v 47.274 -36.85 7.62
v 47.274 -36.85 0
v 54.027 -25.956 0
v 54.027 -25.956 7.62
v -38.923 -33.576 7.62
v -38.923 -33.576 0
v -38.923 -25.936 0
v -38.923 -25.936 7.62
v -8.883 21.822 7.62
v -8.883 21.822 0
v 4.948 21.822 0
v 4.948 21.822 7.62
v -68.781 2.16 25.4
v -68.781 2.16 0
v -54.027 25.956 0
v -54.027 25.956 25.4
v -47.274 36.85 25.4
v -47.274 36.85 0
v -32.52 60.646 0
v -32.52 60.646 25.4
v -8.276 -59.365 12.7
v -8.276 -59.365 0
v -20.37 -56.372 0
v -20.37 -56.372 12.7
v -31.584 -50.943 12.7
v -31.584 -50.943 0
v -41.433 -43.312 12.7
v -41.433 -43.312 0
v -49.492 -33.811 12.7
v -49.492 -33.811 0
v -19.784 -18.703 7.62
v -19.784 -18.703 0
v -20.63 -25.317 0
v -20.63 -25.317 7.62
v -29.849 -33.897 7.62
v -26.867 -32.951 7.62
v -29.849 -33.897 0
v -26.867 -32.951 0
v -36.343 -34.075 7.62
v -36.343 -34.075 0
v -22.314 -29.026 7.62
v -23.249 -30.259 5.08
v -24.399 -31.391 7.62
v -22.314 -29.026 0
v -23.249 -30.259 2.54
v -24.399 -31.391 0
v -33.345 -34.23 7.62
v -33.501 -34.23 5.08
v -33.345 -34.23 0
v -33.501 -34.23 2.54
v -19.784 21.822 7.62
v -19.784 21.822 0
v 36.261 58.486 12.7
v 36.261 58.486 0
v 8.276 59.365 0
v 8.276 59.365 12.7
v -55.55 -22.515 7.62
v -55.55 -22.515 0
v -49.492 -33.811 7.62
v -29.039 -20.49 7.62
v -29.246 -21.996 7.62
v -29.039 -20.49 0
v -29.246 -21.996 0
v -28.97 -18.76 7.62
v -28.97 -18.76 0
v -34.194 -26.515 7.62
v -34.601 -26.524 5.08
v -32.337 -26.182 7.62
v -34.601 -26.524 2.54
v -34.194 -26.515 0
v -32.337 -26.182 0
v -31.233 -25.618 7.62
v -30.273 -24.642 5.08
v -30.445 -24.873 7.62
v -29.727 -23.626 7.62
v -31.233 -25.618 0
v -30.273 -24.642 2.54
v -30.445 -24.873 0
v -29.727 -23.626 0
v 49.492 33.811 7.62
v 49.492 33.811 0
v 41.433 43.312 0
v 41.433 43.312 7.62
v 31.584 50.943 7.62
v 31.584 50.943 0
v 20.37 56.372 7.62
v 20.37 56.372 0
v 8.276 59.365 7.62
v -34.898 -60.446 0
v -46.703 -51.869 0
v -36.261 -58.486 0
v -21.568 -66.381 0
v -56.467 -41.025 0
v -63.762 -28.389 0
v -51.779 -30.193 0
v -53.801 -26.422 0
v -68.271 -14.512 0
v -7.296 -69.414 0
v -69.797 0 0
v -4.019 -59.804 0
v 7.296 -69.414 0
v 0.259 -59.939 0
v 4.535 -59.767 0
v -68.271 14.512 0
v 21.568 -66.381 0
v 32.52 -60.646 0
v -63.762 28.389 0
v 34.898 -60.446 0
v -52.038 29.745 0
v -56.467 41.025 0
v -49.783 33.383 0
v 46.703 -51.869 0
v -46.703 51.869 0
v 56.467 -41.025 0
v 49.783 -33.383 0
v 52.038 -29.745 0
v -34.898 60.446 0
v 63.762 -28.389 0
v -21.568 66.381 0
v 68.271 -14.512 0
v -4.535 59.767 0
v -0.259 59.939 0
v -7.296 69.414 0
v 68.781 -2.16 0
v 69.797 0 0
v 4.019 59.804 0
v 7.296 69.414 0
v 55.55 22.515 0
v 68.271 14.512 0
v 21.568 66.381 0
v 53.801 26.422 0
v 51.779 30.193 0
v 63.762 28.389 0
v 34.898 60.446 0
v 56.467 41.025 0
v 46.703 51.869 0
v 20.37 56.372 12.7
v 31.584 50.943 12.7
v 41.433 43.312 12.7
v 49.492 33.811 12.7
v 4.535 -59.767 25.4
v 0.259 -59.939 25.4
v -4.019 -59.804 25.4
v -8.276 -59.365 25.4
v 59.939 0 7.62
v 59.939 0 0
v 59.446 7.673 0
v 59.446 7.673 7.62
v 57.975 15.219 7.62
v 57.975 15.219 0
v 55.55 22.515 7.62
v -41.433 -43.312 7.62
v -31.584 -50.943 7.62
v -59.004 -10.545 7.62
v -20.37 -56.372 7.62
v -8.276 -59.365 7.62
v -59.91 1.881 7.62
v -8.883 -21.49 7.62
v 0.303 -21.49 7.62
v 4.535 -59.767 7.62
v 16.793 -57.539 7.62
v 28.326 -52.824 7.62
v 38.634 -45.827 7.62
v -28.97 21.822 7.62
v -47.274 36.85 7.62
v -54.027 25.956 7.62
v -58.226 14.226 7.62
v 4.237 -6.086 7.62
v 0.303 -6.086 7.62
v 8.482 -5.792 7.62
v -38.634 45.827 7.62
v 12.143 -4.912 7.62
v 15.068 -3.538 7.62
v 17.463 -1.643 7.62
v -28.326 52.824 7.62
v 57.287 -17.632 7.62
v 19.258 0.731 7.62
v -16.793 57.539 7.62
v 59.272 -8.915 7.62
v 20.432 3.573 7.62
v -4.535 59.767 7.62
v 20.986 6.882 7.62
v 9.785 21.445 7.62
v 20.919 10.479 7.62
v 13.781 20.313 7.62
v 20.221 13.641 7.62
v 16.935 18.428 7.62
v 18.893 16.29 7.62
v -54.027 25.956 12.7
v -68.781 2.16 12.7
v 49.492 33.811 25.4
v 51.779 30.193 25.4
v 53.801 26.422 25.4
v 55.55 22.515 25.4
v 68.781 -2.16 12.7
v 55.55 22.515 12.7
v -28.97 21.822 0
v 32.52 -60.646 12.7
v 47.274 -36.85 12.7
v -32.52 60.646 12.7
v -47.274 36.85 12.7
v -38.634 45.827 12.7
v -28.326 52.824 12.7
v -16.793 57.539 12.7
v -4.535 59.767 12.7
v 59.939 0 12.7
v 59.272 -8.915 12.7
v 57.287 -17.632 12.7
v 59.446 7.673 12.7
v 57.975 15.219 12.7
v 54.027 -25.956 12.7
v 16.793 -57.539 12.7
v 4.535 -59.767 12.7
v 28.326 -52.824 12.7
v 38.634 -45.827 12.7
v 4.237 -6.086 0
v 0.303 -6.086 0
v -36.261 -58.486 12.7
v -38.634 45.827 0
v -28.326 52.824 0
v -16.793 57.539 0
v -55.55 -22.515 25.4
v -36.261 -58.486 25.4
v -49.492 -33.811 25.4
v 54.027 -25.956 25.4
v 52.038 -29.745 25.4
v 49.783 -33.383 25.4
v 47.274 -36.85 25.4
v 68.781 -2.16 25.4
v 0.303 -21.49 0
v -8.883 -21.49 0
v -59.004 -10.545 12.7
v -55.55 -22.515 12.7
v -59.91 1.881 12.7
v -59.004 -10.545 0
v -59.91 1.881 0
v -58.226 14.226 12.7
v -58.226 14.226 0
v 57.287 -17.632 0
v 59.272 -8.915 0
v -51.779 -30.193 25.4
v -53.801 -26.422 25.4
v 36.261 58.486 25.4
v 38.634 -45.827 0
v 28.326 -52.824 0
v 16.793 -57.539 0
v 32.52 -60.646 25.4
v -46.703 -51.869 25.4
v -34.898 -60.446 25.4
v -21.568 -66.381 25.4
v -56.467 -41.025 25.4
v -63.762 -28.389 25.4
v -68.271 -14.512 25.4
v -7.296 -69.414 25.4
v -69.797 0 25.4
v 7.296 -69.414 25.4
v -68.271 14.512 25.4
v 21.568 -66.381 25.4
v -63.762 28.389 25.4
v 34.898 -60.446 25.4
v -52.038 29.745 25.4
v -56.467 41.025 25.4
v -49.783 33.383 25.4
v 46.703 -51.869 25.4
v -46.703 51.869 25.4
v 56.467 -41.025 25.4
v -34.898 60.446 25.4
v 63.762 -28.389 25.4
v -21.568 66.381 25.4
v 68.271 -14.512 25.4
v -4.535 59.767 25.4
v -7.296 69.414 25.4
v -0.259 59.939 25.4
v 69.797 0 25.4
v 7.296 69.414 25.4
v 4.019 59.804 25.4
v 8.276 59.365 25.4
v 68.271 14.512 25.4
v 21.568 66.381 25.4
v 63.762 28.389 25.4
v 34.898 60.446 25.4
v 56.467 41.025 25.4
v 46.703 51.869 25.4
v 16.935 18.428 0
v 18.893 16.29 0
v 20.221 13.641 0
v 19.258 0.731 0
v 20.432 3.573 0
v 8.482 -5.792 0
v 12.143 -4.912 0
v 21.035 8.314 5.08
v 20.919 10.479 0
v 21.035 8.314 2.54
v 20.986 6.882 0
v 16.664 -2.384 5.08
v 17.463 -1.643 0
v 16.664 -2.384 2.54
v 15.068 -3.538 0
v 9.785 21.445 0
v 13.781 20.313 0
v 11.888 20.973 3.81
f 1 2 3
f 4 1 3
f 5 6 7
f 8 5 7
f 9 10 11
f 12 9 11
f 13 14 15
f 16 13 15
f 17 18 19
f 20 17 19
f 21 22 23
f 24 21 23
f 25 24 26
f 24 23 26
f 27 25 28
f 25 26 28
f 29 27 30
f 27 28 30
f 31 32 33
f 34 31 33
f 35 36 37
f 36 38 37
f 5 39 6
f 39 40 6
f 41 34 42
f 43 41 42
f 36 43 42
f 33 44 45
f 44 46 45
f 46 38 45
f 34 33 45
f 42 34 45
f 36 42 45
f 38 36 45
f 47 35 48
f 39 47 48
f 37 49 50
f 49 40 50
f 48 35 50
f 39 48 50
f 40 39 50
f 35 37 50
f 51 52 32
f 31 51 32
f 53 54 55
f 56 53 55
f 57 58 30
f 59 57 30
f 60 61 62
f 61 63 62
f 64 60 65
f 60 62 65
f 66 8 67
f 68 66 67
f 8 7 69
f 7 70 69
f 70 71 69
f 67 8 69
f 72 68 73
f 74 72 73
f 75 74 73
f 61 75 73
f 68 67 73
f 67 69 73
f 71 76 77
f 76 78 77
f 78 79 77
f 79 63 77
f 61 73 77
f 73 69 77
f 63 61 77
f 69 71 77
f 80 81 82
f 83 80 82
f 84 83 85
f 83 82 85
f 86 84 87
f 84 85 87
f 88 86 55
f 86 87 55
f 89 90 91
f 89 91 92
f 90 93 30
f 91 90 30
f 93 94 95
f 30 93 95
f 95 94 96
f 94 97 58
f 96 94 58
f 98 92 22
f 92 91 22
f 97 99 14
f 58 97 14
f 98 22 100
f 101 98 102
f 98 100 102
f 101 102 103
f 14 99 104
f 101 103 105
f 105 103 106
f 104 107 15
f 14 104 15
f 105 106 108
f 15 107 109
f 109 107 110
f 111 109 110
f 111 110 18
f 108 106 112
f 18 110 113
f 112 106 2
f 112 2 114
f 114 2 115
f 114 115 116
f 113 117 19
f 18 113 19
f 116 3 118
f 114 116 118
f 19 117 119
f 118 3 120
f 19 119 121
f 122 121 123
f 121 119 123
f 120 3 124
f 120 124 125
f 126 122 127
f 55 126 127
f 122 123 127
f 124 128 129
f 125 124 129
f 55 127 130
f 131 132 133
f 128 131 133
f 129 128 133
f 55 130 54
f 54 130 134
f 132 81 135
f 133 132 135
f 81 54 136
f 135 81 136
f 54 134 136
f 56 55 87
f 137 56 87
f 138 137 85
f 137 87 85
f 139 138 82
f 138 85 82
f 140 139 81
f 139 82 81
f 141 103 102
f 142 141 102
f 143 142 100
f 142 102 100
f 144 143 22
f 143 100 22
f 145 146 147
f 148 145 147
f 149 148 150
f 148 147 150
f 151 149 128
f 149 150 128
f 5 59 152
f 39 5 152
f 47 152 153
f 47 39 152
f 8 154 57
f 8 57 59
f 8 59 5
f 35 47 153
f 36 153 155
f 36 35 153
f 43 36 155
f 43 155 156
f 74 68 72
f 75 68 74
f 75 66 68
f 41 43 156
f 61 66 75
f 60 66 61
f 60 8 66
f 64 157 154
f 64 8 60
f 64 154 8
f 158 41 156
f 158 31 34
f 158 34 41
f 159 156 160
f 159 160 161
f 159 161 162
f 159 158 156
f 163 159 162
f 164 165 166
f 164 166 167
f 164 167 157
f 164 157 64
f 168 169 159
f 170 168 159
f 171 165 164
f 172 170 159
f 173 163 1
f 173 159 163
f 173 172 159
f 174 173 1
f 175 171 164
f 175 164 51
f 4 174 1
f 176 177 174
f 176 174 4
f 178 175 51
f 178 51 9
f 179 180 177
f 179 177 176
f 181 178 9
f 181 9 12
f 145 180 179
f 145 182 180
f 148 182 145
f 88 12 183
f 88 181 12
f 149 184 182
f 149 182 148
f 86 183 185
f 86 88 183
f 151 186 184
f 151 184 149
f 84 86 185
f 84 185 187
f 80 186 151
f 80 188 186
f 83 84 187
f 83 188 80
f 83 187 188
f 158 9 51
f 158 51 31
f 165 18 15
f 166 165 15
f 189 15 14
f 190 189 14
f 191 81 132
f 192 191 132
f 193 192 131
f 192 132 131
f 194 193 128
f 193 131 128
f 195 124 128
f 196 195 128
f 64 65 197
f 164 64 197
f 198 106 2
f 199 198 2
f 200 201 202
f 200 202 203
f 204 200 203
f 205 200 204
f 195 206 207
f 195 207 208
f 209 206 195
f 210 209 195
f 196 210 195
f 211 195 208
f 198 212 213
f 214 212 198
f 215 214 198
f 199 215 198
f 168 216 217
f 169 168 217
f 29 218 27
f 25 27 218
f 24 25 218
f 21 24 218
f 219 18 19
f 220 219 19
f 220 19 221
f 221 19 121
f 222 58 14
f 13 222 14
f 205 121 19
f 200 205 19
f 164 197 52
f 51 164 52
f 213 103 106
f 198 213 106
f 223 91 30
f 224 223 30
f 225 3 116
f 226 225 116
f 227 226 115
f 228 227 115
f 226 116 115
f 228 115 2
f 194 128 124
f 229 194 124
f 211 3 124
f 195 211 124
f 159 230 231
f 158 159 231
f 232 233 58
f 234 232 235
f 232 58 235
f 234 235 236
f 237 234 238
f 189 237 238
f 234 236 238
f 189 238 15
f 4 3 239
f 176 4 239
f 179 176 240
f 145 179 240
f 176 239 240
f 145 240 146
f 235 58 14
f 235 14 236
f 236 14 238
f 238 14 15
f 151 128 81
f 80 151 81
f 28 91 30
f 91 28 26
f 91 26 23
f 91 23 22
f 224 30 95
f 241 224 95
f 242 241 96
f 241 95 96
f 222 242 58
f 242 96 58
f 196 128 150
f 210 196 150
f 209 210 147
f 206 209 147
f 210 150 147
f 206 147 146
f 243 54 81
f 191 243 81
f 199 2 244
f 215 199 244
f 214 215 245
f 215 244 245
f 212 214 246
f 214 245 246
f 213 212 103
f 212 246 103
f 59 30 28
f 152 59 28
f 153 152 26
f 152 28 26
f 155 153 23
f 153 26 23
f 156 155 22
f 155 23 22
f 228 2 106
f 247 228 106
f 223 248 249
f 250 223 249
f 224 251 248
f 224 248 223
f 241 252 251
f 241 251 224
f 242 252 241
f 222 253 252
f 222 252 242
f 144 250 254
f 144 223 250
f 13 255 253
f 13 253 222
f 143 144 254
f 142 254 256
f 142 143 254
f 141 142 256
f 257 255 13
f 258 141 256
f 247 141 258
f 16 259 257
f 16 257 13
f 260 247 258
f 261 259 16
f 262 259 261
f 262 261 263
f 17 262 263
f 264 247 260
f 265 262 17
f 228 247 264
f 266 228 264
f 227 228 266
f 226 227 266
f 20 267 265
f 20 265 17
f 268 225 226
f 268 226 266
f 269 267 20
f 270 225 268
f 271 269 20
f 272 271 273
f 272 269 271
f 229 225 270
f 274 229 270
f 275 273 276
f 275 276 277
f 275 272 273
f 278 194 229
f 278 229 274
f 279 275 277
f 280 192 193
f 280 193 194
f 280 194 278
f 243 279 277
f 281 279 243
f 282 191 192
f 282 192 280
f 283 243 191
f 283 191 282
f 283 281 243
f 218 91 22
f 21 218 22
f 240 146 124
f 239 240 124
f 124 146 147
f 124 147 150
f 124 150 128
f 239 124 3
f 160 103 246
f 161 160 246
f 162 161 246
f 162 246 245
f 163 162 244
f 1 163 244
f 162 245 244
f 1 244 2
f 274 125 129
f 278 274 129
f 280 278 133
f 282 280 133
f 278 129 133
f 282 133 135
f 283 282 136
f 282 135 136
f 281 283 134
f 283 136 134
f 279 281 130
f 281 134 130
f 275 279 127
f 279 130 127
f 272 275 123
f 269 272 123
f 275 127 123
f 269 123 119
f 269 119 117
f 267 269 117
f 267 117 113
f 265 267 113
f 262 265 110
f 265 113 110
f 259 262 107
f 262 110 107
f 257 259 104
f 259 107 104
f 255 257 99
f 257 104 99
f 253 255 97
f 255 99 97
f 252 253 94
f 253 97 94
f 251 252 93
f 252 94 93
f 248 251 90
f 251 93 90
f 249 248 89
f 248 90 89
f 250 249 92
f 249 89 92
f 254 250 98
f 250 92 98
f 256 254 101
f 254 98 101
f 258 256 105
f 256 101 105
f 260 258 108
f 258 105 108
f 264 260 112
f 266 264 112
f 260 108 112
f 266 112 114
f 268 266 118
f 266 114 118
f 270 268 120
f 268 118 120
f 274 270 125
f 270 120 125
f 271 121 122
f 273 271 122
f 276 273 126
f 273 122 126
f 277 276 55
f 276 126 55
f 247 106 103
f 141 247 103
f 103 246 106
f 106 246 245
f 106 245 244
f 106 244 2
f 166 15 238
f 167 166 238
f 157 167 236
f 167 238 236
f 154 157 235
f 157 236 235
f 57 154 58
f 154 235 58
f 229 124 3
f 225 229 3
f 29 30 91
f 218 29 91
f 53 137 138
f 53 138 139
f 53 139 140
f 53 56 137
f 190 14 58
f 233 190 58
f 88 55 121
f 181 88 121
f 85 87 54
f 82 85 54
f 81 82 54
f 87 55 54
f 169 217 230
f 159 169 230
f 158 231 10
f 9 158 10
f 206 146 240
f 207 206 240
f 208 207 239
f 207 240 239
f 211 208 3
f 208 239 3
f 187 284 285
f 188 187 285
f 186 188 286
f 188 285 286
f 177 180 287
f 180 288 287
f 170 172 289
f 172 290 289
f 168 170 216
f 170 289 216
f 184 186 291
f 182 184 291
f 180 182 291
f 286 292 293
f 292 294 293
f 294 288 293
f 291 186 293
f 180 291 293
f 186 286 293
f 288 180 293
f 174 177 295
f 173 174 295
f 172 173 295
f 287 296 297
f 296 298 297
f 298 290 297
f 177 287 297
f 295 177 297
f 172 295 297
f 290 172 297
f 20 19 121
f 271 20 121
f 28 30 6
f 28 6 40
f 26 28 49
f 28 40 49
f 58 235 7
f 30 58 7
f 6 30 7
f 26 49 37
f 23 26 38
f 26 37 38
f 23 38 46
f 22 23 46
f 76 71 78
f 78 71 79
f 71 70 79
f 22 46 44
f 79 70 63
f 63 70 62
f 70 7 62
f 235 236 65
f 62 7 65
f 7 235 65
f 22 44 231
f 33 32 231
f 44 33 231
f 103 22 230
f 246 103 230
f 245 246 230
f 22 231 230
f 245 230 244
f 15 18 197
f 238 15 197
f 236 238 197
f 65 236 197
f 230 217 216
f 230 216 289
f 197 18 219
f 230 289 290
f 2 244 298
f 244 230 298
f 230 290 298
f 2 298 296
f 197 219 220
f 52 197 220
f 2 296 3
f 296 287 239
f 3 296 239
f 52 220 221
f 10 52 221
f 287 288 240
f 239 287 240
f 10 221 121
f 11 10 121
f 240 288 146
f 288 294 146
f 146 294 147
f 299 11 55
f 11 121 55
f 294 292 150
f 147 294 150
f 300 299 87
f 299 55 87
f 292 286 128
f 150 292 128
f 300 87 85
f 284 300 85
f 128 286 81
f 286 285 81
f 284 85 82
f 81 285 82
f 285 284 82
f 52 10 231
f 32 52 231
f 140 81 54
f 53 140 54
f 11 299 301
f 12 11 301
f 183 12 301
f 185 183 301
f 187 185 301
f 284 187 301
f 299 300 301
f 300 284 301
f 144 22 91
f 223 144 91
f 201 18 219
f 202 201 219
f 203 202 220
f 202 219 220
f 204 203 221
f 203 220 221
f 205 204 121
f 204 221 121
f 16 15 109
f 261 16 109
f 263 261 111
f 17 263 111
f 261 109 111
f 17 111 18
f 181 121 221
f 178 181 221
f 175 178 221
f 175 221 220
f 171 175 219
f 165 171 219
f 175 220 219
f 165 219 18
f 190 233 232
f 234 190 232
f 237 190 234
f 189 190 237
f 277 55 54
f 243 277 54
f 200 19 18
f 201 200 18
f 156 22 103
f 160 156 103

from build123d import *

# Parameters (mm, degrees)
F0_R     = 69.796681711
F1_DEPTH = 25.4
F2_DEPTH = 12.7
F3_DEPTH = 7.62


with BuildPart() as f1:
    # F0 (on Top) → F1 (new body)
    with BuildSketch(Plane.XY):
        Circle(F0_R)
        with BuildLine():
            Line((8.2760019114, 59.3649804818), (36.2610376693, 58.4861839798))
            Line((36.2610376693, 58.4861839798), (49.4924954528, 33.8110338366))
            ThreePointArc((49.4924954528, 33.8110338366), (52.8238405465, 28.3255182682), (55.5495821482, 22.5152623438))
            Line((55.5495821482, 22.5152623438), (68.7810399316, -2.1598877993))
            Line((68.7810399316, -2.1598877993), (54.0274619571, -25.9562414405))
            ThreePointArc((54.0274619571, -25.9562414405), (50.9425386689, -31.5840287047), (47.2735802367, -36.849718138))
            Line((47.2735802367, -36.849718138), (32.5200022623, -60.6460717791))
            Line((32.5200022623, -60.6460717791), (4.5349665043, -59.7672752771))
            ThreePointArc((4.5349665043, -59.7672752771), (-1.8813018777, -59.9095469729), (-8.2760019114, -59.3649804818))
            Line((-8.2760019114, -59.3649804818), (-36.2610376693, -58.4861839798))
            Line((-36.2610376693, -58.4861839798), (-49.4924954528, -33.8110338366))
            ThreePointArc((-49.4924954528, -33.8110338366), (-52.8238405465, -28.3255182682), (-55.5495821482, -22.5152623438))
            Line((-55.5495821482, -22.5152623438), (-68.7810399316, 2.1598877993))
            Line((-68.7810399316, 2.1598877993), (-54.0274619571, 25.9562414405))
            ThreePointArc((-54.0274619571, 25.9562414405), (-50.9425386689, 31.5840287047), (-47.2735802367, 36.849718138))
            Line((-47.2735802367, 36.849718138), (-32.5200022623, 60.6460717791))
            Line((-32.5200022623, 60.6460717791), (-4.5349665043, 59.7672752771))
            ThreePointArc((-4.5349665043, 59.7672752771), (1.8813018777, 59.9095469729), (8.2760019114, 59.3649804818))
        make_face(mode=Mode.SUBTRACT)
    extrude(amount=F1_DEPTH)


with BuildPart() as f2:
    # F0 (on Top) → F2 (new body)
    with BuildSketch(Plane.XY):
        with BuildLine():
            ThreePointArc((-55.5495821482, -22.5152623438), (-59.9095469729, 1.8813018777), (-54.0274619571, 25.9562414405))
            Line((-54.0274619571, 25.9562414405), (-68.7810399316, 2.1598877993))
            Line((-68.7810399316, 2.1598877993), (-55.5495821482, -22.5152623438))
        make_face()
    extrude(amount=F2_DEPTH)


with BuildPart() as f2b:
    # F0 (on Top) → F2, piece 2 (new body)
    with BuildSketch(Plane.XY):
        with BuildLine():
            ThreePointArc((-8.2760019114, -59.3649804818), (-31.5840287047, -50.9425386689), (-49.4924954528, -33.8110338366))
            Line((-49.4924954528, -33.8110338366), (-36.2610376693, -58.4861839798))
            Line((-36.2610376693, -58.4861839798), (-8.2760019114, -59.3649804818))
        make_face()
    extrude(amount=F2_DEPTH)


with BuildPart() as f2c:
    # F0 (on Top) → F2, piece 3 (new body)
    with BuildSketch(Plane.XY):
        with BuildLine():
            ThreePointArc((-47.2735802367, 36.849718138), (-28.3255182682, 52.8238405465), (-4.5349665043, 59.7672752771))
            Line((-4.5349665043, 59.7672752771), (-32.5200022623, 60.6460717791))
            Line((-32.5200022623, 60.6460717791), (-47.2735802367, 36.849718138))
        make_face()
    extrude(amount=F2_DEPTH)


with BuildPart() as f2d:
    # F0 (on Top) → F2, piece 4 (new body)
    with BuildSketch(Plane.XY):
        with BuildLine():
            Line((49.4924954528, 33.8110338366), (36.2610376693, 58.4861839798))
            Line((36.2610376693, 58.4861839798), (8.2760019114, 59.3649804818))
            ThreePointArc((8.2760019114, 59.3649804818), (31.5840287047, 50.9425386689), (49.4924954528, 33.8110338366))
        make_face()
    extrude(amount=F2_DEPTH)


with BuildPart() as f2e:
    # F0 (on Top) → F2, piece 5 (new body)
    with BuildSketch(Plane.XY):
        with BuildLine():
            Line((68.7810399316, -2.1598877993), (55.5495821482, 22.5152623438))
            ThreePointArc((55.5495821482, 22.5152623438), (58.8314706291, 11.4695762285), (59.939078365, 0))
            ThreePointArc((59.939078365, 0), (58.4424904986, -13.3104627856), (54.0274619571, -25.9562414405))
            Line((54.0274619571, -25.9562414405), (68.7810399316, -2.1598877993))
        make_face()
    extrude(amount=F2_DEPTH)


with BuildPart() as f2f:
    # F0 (on Top) → F2, piece 6 (new body)
    with BuildSketch(Plane.XY):
        with BuildLine():
            Line((32.5200022623, -60.6460717791), (47.2735802367, -36.849718138))
            ThreePointArc((47.2735802367, -36.849718138), (28.3255182682, -52.8238405465), (4.5349665043, -59.7672752771))
            Line((4.5349665043, -59.7672752771), (32.5200022623, -60.6460717791))
        make_face()
    extrude(amount=F2_DEPTH)


with BuildPart() as f3:
    # F0 (on Top) → F3 (new body)
    with BuildSketch(Plane.XY):
        with BuildLine():
            Line((55.5495821482, 22.5152623438), (49.4924954528, 33.8110338366))
            ThreePointArc((49.4924954528, 33.8110338366), (31.5840287047, 50.9425386689), (8.2760019114, 59.3649804818))
            Line((8.2760019114, 59.3649804818), (-4.5349665043, 59.7672752771))
            ThreePointArc((-4.5349665043, 59.7672752771), (-28.3255182682, 52.8238405465), (-47.2735802367, 36.849718138))
            Line((-47.2735802367, 36.849718138), (-54.0274619571, 25.9562414405))
            ThreePointArc((-54.0274619571, 25.9562414405), (-59.9095469729, 1.8813018777), (-55.5495821482, -22.5152623438))
            Line((-55.5495821482, -22.5152623438), (-49.4924954528, -33.8110338366))
            ThreePointArc((-49.4924954528, -33.8110338366), (-31.5840287047, -50.9425386689), (-8.2760019114, -59.3649804818))
            Line((-8.2760019114, -59.3649804818), (4.5349665043, -59.7672752771))
            ThreePointArc((4.5349665043, -59.7672752771), (28.3255182682, -52.8238405465), (47.2735802367, -36.849718138))
            Line((47.2735802367, -36.849718138), (54.0274619571, -25.9562414405))
            ThreePointArc((54.0274619571, -25.9562414405), (58.4424904986, -13.3104627856), (59.939078365, 0))
            ThreePointArc((59.939078365, 0), (58.8314706291, 11.4695762285), (55.5495821482, 22.5152623438))
        make_face()
        with BuildLine():
            add(Edge.make_bspline(
                [(-23.2488715606, -30.2585081788), (-26.7136230383, -34.2304120616), (-33.5009337307, -34.2304120616)],
                knots=[0, 0, 0, 1, 1, 1], degree=2))
            add(Edge.make_bspline(
                [(-33.5009337307, -34.2304120616), (-36.6102045506, -34.2304120616), (-38.9231986972, -33.5763276513)],
                knots=[0, 0, 0, 1, 1, 1], degree=2))
            Line((-38.9231986972, -33.5763276513), (-38.9231986972, -25.9358633804))
            add(Edge.make_bspline(
                [(-38.9231986972, -25.9358633804), (-36.5533276454, -26.5235914012), (-34.6005538987, -26.5235914012)],
                knots=[0, 0, 0, 1, 1, 1], degree=2))
            add(Edge.make_bspline(
                [(-34.6005538987, -26.5235914012), (-31.5765984366, -26.5235914012), (-30.2731693581, -24.6419137861)],
                knots=[0, 0, 0, 1, 1, 1], degree=2))
            add(Edge.make_bspline(
                [(-30.2731693581, -24.6419137861), (-28.9697402796, -22.760236171), (-28.9697402796, -18.7598938355)],
                knots=[0, 0, 0, 1, 1, 1], degree=2))
            Line((-28.9697402796, -18.7598938355), (-28.9697402796, 21.8217780554))
            Line((-28.9697402796, 21.8217780554), (-19.7841200829, 21.8217780554))
            Line((-19.7841200829, 21.8217780554), (-19.7841200829, -18.7030169303))
            add(Edge.make_bspline(
                [(-19.7841200829, -18.7030169303), (-19.7841200829, -26.286604296), (-23.2488715606, -30.2585081788)],
                knots=[0, 0, 0, 1, 1, 1], degree=2))
        make_face(mode=Mode.SUBTRACT)
        with BuildLine():
            add(Edge.make_bspline(
                [(16.9346619936, 18.4281227092), (21.0345389132, 15.0344673631), (21.0345389132, 8.3135130602)],
                knots=[0, 0, 0, 1, 1, 1], degree=2))
            add(Edge.make_bspline(
                [(21.0345389132, 8.3135130602), (21.0345389132, 1.3176537153), (16.6644966937, -2.3840848676)],
                knots=[0, 0, 0, 1, 1, 1], degree=2))
            add(Edge.make_bspline(
                [(16.6644966937, -2.3840848676), (12.2944544742, -6.0858234505), (4.2368928981, -6.0858234505)],
                knots=[0, 0, 0, 1, 1, 1], degree=2))
            Line((4.2368928981, -6.0858234505), (0.3029069521, -6.0858234505))
            Line((0.3029069521, -6.0858234505), (0.3029069521, -21.4899852872))
            Line((0.3029069521, -21.4899852872), (-8.8827132446, -21.4899852872))
            Line((-8.8827132446, -21.4899852872), (-8.8827132446, 21.8217780554))
            Line((-8.8827132446, 21.8217780554), (4.9478542136, 21.8217780554))
            add(Edge.make_bspline(
                [(4.9478542136, 21.8217780554), (12.834785074, 21.8217780554), (16.9346619936, 18.4281227092)],
                knots=[0, 0, 0, 1, 1, 1], degree=2))
        make_face(mode=Mode.SUBTRACT)
    extrude(amount=F3_DEPTH)


solid = Compound([f1.part, f2.part, f2b.part, f2c.part, f2d.part, f2e.part, f2f.part, f3.part])
